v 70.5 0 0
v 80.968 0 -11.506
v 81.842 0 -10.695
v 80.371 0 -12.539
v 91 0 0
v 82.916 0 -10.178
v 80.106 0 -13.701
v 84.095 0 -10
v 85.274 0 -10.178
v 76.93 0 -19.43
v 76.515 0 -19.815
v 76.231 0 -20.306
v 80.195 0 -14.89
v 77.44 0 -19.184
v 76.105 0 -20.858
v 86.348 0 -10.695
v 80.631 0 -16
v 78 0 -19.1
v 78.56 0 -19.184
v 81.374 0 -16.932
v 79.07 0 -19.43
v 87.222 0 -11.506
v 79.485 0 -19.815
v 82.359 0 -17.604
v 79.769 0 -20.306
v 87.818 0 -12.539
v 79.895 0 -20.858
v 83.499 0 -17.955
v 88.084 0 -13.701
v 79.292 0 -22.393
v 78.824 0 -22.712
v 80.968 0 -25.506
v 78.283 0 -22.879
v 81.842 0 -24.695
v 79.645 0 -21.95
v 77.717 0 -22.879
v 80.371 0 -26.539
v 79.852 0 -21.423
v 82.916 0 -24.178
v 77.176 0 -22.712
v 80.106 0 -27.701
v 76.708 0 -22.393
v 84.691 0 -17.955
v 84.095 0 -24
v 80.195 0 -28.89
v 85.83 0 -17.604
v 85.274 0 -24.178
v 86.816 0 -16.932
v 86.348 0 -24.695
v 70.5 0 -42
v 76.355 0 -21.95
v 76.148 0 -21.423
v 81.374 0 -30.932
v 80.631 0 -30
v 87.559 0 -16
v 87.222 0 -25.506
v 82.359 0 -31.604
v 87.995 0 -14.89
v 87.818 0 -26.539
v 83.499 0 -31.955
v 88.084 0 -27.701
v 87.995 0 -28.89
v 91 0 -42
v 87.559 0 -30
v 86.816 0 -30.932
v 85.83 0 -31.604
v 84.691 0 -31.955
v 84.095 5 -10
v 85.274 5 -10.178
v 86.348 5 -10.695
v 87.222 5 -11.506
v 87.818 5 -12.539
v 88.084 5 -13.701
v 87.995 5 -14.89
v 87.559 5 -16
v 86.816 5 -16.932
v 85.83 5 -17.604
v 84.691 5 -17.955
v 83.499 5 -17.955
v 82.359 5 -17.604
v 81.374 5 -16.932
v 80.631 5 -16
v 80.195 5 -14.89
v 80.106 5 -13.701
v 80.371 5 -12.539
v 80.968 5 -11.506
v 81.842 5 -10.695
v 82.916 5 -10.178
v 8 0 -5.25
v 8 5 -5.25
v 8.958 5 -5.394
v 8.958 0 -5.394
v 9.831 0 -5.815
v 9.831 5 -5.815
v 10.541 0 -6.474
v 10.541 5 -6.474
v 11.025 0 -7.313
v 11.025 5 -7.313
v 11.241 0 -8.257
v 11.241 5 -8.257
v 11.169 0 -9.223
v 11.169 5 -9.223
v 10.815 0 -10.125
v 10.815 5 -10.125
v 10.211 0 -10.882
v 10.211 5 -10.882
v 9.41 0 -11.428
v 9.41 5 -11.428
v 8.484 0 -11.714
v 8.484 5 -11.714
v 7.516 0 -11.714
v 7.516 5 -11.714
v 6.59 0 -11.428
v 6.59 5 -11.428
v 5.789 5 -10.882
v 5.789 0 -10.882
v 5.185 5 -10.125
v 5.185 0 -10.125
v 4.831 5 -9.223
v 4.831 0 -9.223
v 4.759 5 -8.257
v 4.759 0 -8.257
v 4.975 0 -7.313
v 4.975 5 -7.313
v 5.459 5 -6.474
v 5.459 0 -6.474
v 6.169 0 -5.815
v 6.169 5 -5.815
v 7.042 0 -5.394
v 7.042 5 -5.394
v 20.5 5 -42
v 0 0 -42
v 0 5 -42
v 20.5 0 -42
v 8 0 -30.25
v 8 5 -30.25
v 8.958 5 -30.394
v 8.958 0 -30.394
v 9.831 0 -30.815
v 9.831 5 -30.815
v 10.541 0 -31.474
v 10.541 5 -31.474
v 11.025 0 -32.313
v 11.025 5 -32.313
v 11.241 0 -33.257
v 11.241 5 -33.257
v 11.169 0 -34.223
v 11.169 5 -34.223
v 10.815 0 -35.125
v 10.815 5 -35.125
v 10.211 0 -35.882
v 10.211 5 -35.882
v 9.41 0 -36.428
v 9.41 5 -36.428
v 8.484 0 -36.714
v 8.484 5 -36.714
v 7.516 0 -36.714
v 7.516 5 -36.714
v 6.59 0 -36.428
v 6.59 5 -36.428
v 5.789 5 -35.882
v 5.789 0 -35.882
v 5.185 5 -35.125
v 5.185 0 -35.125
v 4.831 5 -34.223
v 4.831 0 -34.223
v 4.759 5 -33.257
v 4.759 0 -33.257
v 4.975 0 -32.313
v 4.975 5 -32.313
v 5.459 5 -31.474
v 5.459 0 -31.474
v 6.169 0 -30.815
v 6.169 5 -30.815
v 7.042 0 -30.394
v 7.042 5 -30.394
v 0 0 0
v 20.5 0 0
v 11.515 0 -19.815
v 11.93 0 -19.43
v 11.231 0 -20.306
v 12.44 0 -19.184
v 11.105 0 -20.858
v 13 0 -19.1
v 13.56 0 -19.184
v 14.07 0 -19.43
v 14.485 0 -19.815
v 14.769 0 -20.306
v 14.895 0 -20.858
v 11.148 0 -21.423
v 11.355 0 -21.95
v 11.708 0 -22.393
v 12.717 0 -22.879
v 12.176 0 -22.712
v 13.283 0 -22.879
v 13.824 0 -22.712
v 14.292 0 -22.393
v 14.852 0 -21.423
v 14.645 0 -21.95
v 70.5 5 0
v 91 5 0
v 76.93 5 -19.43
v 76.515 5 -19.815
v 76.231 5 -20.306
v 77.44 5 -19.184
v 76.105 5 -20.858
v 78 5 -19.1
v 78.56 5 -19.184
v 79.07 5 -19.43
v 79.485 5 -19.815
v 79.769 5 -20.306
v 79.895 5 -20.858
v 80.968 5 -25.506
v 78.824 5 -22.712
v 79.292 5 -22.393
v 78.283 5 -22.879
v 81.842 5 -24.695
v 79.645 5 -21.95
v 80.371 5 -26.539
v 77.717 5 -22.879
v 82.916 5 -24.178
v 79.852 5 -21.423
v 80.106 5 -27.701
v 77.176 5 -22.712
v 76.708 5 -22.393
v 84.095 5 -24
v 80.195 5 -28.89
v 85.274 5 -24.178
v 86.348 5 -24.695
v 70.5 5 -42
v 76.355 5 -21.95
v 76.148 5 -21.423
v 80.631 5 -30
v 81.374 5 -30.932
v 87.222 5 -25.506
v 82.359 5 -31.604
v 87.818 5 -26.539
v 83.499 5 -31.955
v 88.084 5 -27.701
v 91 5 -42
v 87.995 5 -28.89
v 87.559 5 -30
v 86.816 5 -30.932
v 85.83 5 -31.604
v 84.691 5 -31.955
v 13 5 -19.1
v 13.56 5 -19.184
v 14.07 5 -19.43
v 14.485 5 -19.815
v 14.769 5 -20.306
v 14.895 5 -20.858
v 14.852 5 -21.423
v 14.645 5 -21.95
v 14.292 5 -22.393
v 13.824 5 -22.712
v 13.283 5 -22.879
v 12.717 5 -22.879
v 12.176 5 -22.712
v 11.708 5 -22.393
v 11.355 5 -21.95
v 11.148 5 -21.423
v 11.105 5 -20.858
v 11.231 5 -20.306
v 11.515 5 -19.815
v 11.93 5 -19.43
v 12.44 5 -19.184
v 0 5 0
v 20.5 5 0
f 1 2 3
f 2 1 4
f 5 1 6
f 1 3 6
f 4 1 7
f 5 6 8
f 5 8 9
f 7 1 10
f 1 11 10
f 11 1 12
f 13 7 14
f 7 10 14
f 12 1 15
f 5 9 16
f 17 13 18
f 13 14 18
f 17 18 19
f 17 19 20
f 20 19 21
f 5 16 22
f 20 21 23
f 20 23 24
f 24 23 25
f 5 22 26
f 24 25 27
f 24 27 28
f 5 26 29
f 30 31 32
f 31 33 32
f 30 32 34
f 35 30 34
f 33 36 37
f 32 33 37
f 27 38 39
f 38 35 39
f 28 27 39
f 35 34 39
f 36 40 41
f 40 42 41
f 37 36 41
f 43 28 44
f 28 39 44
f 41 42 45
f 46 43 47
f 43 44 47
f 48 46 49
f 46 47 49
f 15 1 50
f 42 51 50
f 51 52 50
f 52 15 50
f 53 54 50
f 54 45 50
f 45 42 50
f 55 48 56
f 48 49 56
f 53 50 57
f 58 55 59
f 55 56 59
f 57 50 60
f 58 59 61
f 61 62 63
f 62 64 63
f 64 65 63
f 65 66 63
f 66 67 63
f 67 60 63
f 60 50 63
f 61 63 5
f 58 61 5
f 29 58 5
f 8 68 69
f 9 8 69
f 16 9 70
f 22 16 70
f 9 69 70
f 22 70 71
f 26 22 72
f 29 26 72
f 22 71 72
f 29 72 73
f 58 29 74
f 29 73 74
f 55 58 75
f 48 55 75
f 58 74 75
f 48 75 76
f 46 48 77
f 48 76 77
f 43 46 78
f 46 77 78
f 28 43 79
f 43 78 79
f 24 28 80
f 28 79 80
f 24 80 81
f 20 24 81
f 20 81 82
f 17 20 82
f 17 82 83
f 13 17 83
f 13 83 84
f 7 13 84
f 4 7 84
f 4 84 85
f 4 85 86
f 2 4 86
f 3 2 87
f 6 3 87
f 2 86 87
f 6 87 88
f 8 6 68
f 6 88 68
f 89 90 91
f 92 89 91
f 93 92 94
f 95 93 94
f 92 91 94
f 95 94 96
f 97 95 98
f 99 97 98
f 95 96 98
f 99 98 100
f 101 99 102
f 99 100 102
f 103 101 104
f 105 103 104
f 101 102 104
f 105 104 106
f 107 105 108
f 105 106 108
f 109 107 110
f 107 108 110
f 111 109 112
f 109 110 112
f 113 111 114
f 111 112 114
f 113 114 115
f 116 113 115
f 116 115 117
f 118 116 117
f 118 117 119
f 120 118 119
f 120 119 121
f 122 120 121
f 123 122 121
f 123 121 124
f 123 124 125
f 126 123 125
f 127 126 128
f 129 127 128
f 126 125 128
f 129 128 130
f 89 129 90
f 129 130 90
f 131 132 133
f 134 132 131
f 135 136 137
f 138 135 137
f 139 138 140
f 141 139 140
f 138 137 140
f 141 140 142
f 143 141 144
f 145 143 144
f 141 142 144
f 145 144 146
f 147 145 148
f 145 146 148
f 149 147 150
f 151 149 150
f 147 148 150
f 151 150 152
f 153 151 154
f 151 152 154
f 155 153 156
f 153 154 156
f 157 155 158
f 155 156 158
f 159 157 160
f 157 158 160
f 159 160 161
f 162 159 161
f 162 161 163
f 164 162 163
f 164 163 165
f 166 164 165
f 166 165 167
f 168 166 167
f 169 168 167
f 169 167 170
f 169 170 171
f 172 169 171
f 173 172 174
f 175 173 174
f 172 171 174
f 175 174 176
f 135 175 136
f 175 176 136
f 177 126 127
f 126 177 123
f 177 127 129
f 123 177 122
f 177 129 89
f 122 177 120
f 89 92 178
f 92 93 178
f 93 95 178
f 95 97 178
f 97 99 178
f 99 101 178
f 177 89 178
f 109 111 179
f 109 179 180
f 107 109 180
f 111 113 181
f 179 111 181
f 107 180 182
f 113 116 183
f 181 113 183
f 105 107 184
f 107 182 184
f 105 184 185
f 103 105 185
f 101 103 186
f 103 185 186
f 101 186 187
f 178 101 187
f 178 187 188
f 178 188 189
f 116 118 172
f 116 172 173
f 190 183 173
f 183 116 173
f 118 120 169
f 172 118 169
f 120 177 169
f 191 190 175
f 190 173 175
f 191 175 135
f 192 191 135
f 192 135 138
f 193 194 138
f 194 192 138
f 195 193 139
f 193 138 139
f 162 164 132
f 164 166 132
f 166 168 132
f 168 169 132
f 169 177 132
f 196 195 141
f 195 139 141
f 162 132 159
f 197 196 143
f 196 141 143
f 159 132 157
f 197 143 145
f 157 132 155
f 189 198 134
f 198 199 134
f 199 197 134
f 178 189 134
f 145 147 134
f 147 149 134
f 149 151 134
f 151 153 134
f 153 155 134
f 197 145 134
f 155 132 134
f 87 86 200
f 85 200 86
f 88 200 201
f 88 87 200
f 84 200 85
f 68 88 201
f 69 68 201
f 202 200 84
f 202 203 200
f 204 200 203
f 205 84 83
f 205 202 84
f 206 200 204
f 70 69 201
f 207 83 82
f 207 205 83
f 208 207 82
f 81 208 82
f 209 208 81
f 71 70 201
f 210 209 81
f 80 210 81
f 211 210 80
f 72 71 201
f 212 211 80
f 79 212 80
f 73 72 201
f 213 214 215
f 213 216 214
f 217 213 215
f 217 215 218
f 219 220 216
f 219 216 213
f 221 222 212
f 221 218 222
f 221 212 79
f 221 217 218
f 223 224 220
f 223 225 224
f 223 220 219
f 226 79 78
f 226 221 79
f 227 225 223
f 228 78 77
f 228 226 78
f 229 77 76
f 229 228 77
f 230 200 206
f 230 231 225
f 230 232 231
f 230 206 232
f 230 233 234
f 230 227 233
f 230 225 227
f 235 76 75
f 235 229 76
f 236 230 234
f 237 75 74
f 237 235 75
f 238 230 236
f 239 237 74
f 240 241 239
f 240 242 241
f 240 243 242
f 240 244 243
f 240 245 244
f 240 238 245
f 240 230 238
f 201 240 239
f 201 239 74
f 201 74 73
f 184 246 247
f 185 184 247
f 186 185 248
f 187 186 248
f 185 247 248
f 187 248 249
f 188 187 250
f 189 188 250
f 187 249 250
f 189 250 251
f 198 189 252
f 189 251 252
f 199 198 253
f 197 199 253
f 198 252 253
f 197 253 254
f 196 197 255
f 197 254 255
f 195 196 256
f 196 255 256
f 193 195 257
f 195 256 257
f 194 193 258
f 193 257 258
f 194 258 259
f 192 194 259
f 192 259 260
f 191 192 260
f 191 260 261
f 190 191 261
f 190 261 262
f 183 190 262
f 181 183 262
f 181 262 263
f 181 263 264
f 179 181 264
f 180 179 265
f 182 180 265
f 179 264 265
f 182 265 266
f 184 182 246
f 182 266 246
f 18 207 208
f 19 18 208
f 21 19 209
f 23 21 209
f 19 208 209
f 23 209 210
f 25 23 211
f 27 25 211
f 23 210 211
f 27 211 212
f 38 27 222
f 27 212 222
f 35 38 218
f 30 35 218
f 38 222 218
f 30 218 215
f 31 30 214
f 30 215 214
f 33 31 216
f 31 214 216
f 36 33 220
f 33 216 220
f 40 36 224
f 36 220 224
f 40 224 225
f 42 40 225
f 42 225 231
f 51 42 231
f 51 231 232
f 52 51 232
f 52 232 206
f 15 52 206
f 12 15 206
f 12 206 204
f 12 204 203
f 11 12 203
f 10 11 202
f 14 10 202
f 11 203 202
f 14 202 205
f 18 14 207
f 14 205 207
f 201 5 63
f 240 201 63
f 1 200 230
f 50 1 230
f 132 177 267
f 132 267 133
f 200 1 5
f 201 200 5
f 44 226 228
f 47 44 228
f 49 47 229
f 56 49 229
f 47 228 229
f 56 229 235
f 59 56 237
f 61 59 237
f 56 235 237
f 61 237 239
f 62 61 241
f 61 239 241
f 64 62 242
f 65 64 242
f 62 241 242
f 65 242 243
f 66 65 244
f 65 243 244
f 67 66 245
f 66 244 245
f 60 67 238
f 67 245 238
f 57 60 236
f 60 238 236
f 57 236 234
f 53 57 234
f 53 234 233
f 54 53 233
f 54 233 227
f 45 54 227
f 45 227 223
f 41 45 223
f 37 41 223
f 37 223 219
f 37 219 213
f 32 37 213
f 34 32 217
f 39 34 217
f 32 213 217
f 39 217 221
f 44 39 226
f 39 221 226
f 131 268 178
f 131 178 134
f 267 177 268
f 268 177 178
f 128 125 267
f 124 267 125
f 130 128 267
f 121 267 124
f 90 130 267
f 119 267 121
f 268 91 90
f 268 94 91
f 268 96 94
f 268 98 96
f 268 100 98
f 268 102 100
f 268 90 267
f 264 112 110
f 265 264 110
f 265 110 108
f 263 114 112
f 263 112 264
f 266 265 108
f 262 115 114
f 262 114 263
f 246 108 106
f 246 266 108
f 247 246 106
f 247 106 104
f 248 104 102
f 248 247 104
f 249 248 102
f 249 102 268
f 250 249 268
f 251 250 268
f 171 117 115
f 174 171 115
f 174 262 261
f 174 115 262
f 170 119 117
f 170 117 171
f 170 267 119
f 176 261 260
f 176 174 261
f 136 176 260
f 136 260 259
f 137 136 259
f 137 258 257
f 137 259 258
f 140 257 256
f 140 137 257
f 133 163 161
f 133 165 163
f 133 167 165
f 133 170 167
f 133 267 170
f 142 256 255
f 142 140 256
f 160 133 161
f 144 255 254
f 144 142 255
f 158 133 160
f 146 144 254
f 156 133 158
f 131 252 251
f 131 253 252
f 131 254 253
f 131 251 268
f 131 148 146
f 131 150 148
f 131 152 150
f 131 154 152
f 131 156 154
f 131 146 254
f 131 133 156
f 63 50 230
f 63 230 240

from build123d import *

# Parameters (mm, degrees)
SKETCH_1_W          = 91
SKETCH_1_H          = 42
EXTRUDE_1_DEPTH     = 5
SKETCH_2_R          = 1.75
SKETCH_2_R_2        = 2.25
SKETCH_2_R_3        = 1.9
CUT_EXTRUDE_1_DEPTH = 5
SKETCH_3_R          = 4
SKETCH_3_R_2        = 3.25
CUT_EXTRUDE_2_DEPTH = 5
SKETCH_4_W          = 50
SKETCH_4_H          = 42
CUT_EXTRUDE_3_DEPTH = 10


with BuildPart() as part:
    # 스케치1 → 보스-돌출1 (new body)
    with BuildSketch(Plane(origin=(0, 0, 0), x_dir=(1, 0, 0), z_dir=(0, 1, 0))):
        with Locations((45.5, 21)):
            Rectangle(SKETCH_1_W, SKETCH_1_H)
    extrude(amount=EXTRUDE_1_DEPTH)

    # 스케치2 → 컷-돌출1 (cut)
    with BuildSketch(Plane(origin=(0, 5, 0), x_dir=(1, 0, 0), z_dir=(0, 1, 0))):
        with Locations(Location((28, 33.5, 0), (0, 0, 270))):
            Circle(SKETCH_2_R)
        with Locations(Location((28, 8.5, 0), (0, 0, 270))):
            Circle(SKETCH_2_R)
        with Locations(Location((8, 8.5, 0), (0, 0, 270))):
            Circle(SKETCH_2_R)
        with Locations(Location((8, 33.5, 0), (0, 0, 270))):
            Circle(SKETCH_2_R)
        with Locations(Location((42.094873015, 28, 0), (0, 0, 270))):
            Circle(SKETCH_2_R_2)
        with Locations(Location((42.094873015, 14, 0), (0, 0, 270))):
            Circle(SKETCH_2_R_2)
        with Locations(Location((84.094873015, 14, 0), (0, 0, 270))):
            Circle(SKETCH_2_R_2)
        with Locations(Location((84.094873015, 28, 0), (0, 0, 270))):
            Circle(SKETCH_2_R_2)
        with Locations(Location((78, 21, 0), (0, 0, 270))):
            Circle(SKETCH_2_R_3)
        with Locations(Location((13, 21, 0), (0, 0, 270))):
            Circle(SKETCH_2_R_3)
    extrude(amount=-CUT_EXTRUDE_1_DEPTH, mode=Mode.SUBTRACT)

    # 스케치3 → 컷-돌출2 (cut)
    with BuildSketch(Plane(origin=(0, 5, 0), x_dir=(1, 0, 0), z_dir=(0, 1, 0))):
        with Locations(Location((84.094873015, 28, 0), (0, 0, 270))):
            Circle(SKETCH_3_R)
        with Locations(Location((84.094873015, 14, 0), (0, 0, 270))):
            Circle(SKETCH_3_R)
        with Locations(Location((42.094873015, 14, 0), (0, 0, 270))):
            Circle(SKETCH_3_R)
        with Locations(Location((42.094873015, 28, 0), (0, 0, 270))):
            Circle(SKETCH_3_R)
        with Locations(Location((28, 33.5, 0), (0, 0, 270))):
            Circle(SKETCH_3_R_2)
        with Locations(Location((28, 8.5, 0), (0, 0, 270))):
            Circle(SKETCH_3_R_2)
        with Locations(Location((8, 8.5, 0), (0, 0, 270))):
            Circle(SKETCH_3_R_2)
        with Locations(Location((8, 33.5, 0), (0, 0, 270))):
            Circle(SKETCH_3_R_2)
    extrude(amount=-CUT_EXTRUDE_2_DEPTH, mode=Mode.SUBTRACT)

    # 스케치4 → 컷-돌출3 (cut)
    with BuildSketch(Plane(origin=(0, 5, 0), x_dir=(1, 0, 0), z_dir=(0, 1, 0))):
        with Locations((45.5, 21)):
            Rectangle(SKETCH_4_W, SKETCH_4_H)
    extrude(amount=-CUT_EXTRUDE_3_DEPTH, mode=Mode.SUBTRACT)


with BuildPart() as cut_extrude_3_piece_1:
    # of the separate pieces the step leaves, piece 1, a body of its own (cut_extrude_3_pieces)
    add(part.part.solids().sort_by_distance((0, 0, 0))[0])


with BuildPart() as cut_extrude_3_piece_2:
    # of the separate pieces the step leaves, piece 2, a body of its own (cut_extrude_3_pieces)
    add(part.part.solids().sort_by_distance((70.5, 0, 0))[0])


solid = Compound([cut_extrude_3_piece_1.part, cut_extrude_3_piece_2.part])
